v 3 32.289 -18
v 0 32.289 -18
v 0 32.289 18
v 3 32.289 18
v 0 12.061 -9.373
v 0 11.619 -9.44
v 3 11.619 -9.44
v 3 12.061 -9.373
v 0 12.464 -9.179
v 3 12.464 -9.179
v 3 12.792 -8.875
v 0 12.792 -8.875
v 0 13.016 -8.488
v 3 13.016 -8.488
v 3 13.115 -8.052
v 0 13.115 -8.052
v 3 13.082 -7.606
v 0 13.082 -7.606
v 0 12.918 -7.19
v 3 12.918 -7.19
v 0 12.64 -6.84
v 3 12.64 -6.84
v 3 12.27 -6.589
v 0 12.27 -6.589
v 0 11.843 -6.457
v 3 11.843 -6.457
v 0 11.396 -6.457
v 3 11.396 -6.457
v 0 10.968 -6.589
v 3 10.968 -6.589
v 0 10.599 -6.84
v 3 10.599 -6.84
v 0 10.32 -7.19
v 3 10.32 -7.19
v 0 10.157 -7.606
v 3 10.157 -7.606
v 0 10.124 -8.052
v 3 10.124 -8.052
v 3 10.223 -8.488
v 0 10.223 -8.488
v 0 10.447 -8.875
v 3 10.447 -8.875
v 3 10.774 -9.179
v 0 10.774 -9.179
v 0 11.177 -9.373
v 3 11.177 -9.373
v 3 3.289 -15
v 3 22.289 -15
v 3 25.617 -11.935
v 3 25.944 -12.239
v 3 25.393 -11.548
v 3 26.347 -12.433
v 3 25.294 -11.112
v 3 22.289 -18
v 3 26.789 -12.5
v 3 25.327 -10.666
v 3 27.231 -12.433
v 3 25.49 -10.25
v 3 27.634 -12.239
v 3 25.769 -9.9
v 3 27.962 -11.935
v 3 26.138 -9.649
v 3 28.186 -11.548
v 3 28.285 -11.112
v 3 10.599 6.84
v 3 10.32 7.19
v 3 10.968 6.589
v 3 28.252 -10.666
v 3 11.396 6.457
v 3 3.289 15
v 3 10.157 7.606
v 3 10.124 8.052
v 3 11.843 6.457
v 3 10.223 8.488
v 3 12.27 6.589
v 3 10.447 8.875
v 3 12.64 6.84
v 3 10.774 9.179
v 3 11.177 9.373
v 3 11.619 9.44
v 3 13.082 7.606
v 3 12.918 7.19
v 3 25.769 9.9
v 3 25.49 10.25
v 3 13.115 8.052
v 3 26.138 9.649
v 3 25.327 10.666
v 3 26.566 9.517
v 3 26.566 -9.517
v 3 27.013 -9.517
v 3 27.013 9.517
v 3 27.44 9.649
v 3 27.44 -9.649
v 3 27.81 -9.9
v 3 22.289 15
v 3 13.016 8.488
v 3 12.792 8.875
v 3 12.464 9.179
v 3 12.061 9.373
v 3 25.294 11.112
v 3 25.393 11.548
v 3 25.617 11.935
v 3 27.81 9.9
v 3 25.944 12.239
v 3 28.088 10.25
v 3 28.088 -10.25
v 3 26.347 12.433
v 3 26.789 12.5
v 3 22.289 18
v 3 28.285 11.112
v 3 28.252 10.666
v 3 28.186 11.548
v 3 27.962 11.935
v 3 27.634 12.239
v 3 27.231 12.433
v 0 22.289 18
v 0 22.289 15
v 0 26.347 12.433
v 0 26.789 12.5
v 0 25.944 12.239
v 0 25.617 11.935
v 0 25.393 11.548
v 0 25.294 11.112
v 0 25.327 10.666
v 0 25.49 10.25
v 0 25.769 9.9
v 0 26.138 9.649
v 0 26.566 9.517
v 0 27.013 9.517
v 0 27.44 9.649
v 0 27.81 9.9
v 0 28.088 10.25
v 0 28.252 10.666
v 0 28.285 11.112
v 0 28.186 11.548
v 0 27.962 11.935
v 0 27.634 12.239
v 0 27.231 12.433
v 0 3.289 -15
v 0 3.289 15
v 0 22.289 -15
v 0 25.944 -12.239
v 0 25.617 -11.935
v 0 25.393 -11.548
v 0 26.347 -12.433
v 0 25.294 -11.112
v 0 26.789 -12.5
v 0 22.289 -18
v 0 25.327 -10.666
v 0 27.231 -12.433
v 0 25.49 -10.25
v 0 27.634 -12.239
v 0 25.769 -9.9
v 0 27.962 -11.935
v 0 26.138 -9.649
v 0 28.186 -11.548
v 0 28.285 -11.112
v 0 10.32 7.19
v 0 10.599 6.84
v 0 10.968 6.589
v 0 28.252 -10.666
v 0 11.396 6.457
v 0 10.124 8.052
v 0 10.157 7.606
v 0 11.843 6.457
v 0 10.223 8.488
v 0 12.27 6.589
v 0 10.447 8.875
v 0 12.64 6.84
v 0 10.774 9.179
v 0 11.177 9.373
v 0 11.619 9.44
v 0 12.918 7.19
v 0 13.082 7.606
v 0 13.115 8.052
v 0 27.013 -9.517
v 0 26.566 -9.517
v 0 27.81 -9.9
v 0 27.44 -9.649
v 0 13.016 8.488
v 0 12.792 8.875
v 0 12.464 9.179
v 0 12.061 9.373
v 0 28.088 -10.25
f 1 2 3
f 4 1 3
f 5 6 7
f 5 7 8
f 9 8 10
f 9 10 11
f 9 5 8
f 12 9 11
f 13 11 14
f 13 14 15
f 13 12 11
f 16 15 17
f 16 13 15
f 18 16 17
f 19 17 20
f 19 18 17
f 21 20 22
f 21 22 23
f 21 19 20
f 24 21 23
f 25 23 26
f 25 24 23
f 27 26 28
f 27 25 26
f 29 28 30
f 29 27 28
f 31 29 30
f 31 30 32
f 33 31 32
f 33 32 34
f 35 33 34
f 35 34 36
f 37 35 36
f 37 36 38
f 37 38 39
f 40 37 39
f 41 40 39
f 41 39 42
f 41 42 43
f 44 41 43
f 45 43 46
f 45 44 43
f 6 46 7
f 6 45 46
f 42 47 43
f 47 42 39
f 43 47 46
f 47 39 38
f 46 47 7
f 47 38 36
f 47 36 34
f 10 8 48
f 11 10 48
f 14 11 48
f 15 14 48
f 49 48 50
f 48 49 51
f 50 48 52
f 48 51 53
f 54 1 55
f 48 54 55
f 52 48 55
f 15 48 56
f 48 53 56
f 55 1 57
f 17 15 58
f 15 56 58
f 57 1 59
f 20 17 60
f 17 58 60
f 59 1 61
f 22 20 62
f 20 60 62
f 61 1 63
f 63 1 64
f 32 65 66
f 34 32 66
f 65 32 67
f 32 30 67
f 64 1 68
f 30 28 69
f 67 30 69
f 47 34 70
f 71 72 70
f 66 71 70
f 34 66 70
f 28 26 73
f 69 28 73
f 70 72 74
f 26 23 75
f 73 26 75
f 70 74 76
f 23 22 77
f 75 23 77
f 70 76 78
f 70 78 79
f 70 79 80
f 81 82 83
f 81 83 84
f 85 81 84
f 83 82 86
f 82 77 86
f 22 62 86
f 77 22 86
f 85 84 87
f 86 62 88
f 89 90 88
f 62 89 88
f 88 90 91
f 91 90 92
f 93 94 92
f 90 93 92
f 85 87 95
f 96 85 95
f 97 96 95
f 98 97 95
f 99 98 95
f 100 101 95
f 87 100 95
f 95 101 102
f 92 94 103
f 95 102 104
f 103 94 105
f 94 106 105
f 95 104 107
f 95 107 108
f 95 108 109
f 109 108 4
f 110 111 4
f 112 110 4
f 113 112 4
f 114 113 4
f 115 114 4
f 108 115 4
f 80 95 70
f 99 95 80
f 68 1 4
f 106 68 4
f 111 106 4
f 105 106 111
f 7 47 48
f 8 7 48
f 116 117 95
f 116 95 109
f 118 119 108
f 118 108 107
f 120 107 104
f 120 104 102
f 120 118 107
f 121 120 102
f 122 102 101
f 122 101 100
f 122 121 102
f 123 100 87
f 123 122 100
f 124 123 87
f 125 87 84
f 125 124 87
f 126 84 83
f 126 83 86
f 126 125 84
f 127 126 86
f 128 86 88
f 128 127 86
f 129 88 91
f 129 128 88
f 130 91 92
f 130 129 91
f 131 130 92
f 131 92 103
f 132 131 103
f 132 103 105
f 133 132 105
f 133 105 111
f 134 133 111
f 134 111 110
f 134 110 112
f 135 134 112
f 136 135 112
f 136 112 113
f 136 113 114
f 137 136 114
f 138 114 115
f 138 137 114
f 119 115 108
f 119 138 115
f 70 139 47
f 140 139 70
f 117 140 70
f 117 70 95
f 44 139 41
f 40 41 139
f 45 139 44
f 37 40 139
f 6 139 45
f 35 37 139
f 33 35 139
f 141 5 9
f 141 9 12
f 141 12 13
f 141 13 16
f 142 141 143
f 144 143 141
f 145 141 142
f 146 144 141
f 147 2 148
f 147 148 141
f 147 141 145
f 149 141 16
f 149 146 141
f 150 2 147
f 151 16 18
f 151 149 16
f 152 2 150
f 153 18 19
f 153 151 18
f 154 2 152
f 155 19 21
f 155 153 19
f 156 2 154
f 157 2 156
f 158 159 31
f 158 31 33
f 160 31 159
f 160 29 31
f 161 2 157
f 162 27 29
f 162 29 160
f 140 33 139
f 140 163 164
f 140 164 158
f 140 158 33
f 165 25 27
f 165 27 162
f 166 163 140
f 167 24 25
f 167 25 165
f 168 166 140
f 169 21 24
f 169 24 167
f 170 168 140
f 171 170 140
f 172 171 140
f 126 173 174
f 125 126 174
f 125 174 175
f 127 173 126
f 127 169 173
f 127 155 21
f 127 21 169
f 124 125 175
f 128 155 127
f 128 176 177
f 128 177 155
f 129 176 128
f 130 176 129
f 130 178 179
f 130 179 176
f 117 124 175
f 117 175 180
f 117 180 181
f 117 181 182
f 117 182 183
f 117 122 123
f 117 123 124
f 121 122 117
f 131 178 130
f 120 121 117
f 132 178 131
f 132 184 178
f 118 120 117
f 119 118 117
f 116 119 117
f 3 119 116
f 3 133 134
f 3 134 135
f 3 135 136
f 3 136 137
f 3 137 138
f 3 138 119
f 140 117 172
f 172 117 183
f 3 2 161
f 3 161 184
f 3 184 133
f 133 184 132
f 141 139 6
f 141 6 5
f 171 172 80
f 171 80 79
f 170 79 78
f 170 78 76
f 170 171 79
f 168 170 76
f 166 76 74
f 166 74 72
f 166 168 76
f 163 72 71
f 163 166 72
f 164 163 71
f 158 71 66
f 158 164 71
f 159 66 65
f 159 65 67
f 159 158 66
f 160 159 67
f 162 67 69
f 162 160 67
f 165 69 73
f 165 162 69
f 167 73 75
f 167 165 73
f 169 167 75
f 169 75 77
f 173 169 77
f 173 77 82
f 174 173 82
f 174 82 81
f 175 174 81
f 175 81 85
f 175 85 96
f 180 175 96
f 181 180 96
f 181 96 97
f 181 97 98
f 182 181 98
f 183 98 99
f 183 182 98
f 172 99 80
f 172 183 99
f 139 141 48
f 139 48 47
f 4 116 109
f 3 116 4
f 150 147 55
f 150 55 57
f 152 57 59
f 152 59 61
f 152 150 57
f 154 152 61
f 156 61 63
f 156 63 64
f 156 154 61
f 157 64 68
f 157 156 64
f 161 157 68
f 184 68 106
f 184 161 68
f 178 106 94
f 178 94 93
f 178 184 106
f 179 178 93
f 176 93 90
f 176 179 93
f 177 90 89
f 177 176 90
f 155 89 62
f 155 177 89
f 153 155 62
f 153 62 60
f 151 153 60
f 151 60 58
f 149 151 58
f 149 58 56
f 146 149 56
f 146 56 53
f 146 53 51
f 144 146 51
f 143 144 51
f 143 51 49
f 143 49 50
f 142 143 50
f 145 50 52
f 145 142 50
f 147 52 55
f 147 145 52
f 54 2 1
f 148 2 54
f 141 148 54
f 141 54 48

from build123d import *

# Parameters (mm, degrees)
SKETCH1_R           = 1.5
BOSS_EXTRUDE1_DEPTH = 3


with BuildPart() as part:
    # Sketch1 → Boss-Extrude1 (new body)
    with BuildSketch(Plane(origin=(0, 0, 0), x_dir=(0, 0, -1), z_dir=(1, 0, 0))):
        Polygon((15, 3.289322104), (-15, 3.289322104), (-15, 22.289322104), (-18, 22.289322104), (-18, 32.289322104), (-15, 32.289322104), (15, 32.289322104), (18, 32.289322104), (18, 22.289322104), (15, 22.289322104), align=None)
        with Locations((7.94, 11.619322104)):
            Circle(SKETCH1_R, mode=Mode.SUBTRACT)
        with Locations(Location((-7.94, 11.619322104, 0), (0, 0, 180))):
            Circle(SKETCH1_R, mode=Mode.SUBTRACT)
        with Locations((11, 26.789322104)):
            Circle(SKETCH1_R, mode=Mode.SUBTRACT)
        with Locations(Location((-11, 26.789322104, 0), (0, 0, 180))):
            Circle(SKETCH1_R, mode=Mode.SUBTRACT)
    extrude(amount=BOSS_EXTRUDE1_DEPTH)


solid = part.part
